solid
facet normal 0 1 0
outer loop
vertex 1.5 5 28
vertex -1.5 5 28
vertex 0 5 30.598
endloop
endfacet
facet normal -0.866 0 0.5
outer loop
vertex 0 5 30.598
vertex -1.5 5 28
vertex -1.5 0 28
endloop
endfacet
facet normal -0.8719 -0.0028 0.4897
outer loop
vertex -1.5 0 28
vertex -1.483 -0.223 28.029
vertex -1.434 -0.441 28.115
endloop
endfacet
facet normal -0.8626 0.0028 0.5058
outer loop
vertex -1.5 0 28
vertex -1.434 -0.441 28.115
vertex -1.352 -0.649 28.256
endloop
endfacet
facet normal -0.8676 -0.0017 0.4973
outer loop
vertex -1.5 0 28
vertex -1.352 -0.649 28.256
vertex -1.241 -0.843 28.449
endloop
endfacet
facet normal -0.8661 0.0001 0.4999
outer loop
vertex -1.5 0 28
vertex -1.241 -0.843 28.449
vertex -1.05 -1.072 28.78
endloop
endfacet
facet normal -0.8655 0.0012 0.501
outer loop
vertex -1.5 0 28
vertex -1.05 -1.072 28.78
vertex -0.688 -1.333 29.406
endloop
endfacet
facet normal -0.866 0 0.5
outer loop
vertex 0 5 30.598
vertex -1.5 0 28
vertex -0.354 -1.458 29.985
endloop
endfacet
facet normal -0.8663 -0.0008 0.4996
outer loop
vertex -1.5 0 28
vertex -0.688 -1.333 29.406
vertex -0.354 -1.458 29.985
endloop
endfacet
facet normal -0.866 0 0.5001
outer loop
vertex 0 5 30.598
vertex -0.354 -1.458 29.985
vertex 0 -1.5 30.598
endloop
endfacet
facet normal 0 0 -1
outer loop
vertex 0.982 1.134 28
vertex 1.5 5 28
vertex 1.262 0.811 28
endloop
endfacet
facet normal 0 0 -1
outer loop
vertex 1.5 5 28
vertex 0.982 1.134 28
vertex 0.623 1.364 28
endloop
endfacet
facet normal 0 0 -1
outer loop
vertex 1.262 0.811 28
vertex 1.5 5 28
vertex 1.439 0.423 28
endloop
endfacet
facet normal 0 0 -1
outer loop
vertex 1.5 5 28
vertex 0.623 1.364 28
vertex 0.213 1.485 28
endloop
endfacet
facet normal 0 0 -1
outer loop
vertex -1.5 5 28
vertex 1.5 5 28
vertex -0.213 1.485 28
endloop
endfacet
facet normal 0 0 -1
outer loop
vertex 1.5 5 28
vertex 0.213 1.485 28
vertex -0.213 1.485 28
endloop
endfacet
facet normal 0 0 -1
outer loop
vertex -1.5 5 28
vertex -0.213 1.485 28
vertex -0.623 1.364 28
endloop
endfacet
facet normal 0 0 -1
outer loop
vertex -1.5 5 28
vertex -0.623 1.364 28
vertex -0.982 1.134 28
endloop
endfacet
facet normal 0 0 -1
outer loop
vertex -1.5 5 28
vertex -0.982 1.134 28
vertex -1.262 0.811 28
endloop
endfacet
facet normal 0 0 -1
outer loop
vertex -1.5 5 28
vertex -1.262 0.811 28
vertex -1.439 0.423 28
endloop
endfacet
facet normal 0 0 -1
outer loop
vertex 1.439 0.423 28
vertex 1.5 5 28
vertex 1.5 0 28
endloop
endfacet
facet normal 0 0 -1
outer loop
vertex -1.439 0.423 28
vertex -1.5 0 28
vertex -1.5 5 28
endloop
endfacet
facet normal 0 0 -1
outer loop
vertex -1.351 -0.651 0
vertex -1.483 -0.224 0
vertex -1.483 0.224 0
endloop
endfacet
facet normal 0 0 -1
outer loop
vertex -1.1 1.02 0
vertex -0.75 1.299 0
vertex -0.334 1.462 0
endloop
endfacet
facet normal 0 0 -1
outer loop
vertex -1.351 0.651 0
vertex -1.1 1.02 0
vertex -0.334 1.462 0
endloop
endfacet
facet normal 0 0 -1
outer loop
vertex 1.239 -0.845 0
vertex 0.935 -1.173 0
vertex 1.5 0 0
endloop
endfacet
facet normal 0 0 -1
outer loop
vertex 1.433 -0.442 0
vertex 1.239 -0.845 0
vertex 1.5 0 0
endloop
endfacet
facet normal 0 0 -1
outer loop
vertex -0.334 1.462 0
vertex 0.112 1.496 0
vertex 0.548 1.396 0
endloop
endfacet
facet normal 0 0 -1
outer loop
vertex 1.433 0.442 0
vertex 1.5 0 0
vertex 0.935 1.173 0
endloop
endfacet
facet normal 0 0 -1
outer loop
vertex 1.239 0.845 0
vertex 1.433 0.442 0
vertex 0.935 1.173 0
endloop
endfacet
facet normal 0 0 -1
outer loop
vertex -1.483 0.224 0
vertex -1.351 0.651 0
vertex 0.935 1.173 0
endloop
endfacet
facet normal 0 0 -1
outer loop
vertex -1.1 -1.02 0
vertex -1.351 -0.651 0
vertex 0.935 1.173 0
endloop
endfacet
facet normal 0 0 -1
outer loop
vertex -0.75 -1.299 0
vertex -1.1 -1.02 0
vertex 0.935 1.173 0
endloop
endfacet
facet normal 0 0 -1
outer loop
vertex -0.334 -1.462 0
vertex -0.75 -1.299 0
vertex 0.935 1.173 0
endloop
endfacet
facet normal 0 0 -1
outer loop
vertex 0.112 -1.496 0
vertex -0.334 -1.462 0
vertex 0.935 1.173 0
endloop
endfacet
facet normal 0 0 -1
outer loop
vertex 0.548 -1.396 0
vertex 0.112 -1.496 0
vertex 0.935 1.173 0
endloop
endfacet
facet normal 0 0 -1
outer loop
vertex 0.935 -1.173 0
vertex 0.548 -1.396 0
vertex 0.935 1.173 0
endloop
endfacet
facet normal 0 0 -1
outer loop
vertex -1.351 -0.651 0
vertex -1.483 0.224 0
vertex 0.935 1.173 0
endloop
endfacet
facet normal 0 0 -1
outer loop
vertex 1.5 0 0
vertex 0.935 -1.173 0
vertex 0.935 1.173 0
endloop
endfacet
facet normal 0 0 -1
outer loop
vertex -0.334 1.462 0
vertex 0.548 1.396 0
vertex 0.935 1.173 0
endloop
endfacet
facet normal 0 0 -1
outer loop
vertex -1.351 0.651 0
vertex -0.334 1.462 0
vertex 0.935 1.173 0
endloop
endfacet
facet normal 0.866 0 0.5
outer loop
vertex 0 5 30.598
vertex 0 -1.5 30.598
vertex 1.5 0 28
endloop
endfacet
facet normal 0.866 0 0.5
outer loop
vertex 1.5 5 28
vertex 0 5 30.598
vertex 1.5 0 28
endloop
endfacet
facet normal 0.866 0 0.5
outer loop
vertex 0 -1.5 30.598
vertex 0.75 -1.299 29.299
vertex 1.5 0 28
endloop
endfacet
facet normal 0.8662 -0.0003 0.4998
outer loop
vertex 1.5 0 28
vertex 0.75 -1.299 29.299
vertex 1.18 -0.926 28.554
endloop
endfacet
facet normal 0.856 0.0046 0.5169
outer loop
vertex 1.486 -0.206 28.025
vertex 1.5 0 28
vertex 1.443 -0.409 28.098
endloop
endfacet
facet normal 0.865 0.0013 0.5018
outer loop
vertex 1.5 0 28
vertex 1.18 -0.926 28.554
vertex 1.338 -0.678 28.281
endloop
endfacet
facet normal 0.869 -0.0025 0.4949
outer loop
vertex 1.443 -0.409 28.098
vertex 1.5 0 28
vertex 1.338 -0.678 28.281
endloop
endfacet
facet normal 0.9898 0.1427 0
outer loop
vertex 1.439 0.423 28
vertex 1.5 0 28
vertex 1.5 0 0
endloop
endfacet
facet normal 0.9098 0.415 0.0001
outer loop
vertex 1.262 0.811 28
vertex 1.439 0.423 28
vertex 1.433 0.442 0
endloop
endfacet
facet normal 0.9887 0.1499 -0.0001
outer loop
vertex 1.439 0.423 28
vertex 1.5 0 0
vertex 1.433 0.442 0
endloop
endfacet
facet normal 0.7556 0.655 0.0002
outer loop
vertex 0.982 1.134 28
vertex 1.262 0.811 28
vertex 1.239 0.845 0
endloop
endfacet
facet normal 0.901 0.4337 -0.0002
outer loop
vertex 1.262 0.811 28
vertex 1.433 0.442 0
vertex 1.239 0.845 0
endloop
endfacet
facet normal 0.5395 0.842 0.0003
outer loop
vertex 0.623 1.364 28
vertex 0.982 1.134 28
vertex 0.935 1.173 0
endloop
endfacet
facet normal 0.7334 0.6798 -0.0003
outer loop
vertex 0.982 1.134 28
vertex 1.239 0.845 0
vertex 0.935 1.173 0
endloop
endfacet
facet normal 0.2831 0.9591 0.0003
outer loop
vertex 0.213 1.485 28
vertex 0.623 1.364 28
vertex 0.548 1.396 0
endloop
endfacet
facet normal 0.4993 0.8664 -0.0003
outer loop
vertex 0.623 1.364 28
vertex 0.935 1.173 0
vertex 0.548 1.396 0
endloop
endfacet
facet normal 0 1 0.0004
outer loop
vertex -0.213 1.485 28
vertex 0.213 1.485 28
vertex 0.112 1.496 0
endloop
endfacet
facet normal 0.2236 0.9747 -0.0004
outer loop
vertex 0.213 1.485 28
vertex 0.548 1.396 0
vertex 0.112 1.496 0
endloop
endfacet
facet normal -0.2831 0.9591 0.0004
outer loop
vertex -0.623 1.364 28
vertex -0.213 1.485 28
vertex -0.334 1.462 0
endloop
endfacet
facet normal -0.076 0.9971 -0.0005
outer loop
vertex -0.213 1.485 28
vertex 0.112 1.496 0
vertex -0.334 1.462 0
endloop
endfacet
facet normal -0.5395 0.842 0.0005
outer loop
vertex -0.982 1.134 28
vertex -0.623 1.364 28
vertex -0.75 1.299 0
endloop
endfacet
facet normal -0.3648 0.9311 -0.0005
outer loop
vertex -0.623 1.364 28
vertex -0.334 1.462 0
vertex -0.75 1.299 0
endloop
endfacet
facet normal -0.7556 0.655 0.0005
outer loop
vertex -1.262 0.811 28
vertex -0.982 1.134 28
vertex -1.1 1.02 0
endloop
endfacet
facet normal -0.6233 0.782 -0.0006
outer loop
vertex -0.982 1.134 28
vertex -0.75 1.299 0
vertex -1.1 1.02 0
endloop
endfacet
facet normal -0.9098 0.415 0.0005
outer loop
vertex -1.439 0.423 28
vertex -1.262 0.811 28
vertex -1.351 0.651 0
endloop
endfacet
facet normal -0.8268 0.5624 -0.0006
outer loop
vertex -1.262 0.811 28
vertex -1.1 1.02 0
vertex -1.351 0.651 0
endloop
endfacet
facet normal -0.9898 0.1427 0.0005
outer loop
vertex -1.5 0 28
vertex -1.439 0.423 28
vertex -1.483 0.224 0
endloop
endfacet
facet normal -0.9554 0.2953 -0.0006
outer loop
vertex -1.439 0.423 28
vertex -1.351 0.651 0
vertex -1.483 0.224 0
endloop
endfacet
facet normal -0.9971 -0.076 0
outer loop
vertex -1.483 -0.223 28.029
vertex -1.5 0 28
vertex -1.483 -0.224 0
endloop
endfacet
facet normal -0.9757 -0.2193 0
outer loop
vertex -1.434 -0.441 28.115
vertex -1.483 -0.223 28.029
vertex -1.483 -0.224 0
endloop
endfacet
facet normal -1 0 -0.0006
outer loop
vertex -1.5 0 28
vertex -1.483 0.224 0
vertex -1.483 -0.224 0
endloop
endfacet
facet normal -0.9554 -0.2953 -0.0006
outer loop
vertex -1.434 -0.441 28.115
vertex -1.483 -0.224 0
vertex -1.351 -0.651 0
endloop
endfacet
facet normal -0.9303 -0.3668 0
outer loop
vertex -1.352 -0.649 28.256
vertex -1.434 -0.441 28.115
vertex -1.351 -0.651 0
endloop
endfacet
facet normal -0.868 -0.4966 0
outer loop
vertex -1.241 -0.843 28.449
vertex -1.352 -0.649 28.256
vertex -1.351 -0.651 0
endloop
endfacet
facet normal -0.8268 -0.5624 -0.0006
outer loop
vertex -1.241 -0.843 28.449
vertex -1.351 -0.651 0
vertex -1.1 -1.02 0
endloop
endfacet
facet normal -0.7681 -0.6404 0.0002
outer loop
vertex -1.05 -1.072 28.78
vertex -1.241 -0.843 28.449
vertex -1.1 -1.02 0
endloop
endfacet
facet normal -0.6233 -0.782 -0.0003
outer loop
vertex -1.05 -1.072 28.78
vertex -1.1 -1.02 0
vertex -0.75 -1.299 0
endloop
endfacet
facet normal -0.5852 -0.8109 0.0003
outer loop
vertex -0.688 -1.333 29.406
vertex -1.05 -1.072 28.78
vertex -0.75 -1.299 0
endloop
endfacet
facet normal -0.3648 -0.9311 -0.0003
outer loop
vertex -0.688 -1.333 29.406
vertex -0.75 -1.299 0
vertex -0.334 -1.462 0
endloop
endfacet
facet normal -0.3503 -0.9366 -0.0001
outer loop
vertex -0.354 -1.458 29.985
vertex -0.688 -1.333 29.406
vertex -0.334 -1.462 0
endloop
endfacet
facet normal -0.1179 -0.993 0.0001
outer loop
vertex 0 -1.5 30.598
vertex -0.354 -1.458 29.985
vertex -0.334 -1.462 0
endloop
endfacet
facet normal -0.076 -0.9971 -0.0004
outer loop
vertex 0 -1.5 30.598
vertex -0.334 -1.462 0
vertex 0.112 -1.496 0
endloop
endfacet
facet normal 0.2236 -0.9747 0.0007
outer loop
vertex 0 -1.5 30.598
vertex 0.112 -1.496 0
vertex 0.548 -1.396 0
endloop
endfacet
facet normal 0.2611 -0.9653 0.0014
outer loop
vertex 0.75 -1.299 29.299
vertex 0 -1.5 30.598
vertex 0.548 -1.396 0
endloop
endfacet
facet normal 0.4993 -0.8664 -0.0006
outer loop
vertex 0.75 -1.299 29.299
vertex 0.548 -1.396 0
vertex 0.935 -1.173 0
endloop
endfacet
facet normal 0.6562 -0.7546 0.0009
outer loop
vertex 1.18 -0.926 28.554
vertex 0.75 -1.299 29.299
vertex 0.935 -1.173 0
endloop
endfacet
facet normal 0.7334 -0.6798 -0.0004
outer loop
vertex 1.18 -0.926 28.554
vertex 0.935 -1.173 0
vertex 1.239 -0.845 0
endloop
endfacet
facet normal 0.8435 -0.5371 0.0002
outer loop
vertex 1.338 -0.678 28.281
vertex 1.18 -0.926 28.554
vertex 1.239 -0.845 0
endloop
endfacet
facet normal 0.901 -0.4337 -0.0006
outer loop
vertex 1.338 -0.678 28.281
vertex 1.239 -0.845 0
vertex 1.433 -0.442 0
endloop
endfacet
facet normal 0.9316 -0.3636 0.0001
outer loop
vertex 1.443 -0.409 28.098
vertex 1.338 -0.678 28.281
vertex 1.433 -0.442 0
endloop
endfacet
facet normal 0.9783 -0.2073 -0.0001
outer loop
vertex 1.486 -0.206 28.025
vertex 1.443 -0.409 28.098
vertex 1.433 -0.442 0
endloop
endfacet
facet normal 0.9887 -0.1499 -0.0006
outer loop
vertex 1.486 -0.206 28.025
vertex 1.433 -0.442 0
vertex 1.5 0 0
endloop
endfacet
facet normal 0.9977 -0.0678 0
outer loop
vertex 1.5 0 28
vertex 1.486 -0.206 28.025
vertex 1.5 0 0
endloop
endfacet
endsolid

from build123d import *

# Parameters (mm, degrees)
SKETCH_5_R          = 1.5
EXTRUDE_4_DEPTH     = 31
SKETCH_6_W          = 3
SKETCH_6_H          = 1.5
CUT_EXTRUDE_2_DEPTH = 3
CUT_EXTRUDE_3_DEPTH = 1.5
EXTRUDE_5_DEPTH     = 5


with BuildPart() as part:
    # 草图5 → 凸台-拉伸4 (new body)
    with BuildSketch(Plane.XY):
        Circle(SKETCH_5_R)
    extrude(amount=EXTRUDE_4_DEPTH)

    # 草图6 → 切除-拉伸2 (cut)
    with BuildSketch(Plane.XY.offset(31)):
        with Locations((0, 0.75)):
            Rectangle(SKETCH_6_W, SKETCH_6_H)
    extrude(amount=-CUT_EXTRUDE_2_DEPTH, mode=Mode.SUBTRACT)

    # 草图7 → 切除-拉伸3 (cut)
    with BuildSketch(Plane(origin=(0, 0, 0), x_dir=(1, 0, 0), z_dir=(0, 1, 0))):
        Polygon((-1.5, -28), (0, -30.598076211), (1.5, -28), (1.5, -31), (-1.5, -31), align=None)
    extrude(amount=-CUT_EXTRUDE_3_DEPTH, mode=Mode.SUBTRACT)

    # 草图8 → 凸台-拉伸5 (add)
    with BuildSketch(Plane(origin=(0, 0, 0), x_dir=(1, 0, 0), z_dir=(0, 1, 0))):
        Polygon((0, -30.598076211), (1.5, -28), (-1.5, -28), align=None)
    extrude(amount=EXTRUDE_5_DEPTH)


solid = part.part
